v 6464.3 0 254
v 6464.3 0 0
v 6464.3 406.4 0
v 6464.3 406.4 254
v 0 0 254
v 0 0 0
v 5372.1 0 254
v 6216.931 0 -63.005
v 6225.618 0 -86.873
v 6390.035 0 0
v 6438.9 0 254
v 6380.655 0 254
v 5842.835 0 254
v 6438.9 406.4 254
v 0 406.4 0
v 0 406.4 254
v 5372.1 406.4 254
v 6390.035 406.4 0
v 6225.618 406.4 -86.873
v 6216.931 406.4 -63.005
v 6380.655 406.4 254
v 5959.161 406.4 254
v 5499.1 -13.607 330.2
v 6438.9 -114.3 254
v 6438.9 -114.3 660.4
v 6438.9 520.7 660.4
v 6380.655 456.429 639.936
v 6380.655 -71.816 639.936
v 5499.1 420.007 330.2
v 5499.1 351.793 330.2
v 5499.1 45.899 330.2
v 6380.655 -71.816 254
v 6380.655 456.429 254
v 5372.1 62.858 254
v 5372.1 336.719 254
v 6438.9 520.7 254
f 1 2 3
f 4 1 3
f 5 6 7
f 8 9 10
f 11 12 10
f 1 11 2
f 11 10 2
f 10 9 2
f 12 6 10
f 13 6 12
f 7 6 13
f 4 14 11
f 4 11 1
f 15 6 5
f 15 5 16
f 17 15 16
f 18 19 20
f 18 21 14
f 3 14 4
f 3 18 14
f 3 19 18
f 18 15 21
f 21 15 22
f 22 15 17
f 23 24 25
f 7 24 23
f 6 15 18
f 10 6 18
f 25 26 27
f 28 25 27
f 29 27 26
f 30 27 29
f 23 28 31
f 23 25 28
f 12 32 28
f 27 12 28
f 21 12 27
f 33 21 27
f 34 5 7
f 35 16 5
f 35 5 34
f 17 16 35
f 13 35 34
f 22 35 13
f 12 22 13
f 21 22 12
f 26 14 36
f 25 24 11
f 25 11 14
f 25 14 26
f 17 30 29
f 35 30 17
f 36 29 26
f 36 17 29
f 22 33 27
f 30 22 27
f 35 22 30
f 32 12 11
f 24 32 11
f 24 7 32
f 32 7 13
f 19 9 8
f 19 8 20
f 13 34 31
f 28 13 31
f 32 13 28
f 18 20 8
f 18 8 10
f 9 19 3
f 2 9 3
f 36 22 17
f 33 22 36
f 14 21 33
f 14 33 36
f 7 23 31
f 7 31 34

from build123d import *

# Parameters (mm, degrees)
F0_W      = 6464.3
F0_H      = 406.4
F1_DEPTH  = 254
F4_DEPTH  = 635
F6_DEPTH  = 406.401
F8_DEPTH  = 406.401
F10_W     = 254
F10_H     = 406.4
F11_DEPTH = 25.4


with BuildPart() as f1:
    # F0 (on Top) → F1 (new body)
    with BuildSketch(Plane.XY):
        with Locations((3232.15, 203.2)):
            Rectangle(F0_W, F0_H)
    extrude(amount=F1_DEPTH)

    # F3 (on offset) → F4 (join)
    with BuildSketch(Plane.XZ.offset(114.3)):
        Polygon((6438.9, 254), (6438.9, 660.4), (5499.1, 330.2), (5372.1, 254), align=None)
    extrude(amount=-F4_DEPTH)

    # F5 (on face) → F6 (cut, through all)
    with BuildSketch(Plane.XY.offset(254)):
        Polygon((5372.1, 520.7), (5372.1, 406.4), (6438.9, 520.7), align=None)
        Polygon((6438.9, -114.3), (5372.1, 0), (5372.1, -114.3), align=None)
    extrude(amount=F6_DEPTH, mode=Mode.SUBTRACT)

    # F7 (on face) → F8 (cut, through all)
    with BuildSketch(Plane.XY.offset(254)):
        Polygon((6380.6552886963, 456.4289748669), (5333.4875106812, 332.1360945702), (5333.4875106812, 68.0137723684), (6380.6552886963, -71.8156844378), align=None)
    extrude(amount=F8_DEPTH, mode=Mode.SUBTRACT)

    # F10 (on face) → F11 (join)
    with BuildSketch(Plane(origin=(756.179453173, 0, -2077.5859726483), x_dir=(0.9396926208, 0, 0.3420201433), z_dir=(-0.3420201433, 0, 0.9396926208))):
        with Locations((5947.4550085463, 203.2)):
            Rectangle(F10_W, F10_H)
    extrude(amount=F11_DEPTH)


solid = f1.part
